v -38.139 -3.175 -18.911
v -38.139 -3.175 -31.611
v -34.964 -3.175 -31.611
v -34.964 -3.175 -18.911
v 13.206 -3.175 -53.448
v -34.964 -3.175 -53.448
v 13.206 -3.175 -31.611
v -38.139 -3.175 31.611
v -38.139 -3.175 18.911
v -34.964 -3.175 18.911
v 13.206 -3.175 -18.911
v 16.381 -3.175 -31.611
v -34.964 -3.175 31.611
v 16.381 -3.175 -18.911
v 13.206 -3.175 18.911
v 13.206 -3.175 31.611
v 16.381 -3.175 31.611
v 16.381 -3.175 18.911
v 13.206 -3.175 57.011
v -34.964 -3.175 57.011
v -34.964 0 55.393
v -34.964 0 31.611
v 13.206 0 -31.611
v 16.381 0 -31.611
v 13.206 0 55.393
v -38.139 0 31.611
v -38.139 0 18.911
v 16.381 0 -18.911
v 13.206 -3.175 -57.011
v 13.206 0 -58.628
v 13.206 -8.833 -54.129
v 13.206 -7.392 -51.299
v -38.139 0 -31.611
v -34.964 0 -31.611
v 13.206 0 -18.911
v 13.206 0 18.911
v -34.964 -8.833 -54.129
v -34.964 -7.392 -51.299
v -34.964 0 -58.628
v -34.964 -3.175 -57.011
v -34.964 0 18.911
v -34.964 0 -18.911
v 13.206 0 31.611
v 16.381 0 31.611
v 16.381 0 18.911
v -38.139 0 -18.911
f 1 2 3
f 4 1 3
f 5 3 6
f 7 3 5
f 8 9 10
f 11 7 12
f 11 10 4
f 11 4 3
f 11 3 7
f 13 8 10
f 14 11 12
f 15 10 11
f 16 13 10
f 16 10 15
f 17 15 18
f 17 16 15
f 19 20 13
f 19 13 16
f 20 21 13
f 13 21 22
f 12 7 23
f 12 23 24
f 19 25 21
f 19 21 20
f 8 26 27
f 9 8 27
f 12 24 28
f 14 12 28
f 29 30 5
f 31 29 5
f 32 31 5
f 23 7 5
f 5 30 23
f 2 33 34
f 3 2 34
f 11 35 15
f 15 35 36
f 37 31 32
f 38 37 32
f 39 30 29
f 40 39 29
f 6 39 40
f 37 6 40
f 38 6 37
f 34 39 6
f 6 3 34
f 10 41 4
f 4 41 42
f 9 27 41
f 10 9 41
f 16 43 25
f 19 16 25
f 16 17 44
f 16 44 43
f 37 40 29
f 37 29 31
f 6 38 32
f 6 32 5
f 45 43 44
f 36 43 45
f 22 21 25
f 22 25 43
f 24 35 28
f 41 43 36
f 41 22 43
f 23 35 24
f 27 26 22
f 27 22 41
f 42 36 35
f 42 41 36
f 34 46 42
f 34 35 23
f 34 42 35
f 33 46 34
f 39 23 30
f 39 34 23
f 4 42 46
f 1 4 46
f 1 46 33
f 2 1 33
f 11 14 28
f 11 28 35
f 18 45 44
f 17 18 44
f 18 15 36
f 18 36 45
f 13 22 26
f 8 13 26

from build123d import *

# Parameters (mm, degrees)
F1_DEPTH = 3.175
F3_DEPTH = 43.942
F5_DEPTH = 76.2
F6_DEPTH = 48.1697538


# Not quite as in the source:
# - a feature names something its author has since deleted; it is built from what else it names


with BuildPart() as f1:
    # F0 (on Front) → F1 (new body)
    with BuildSketch(Plane.XZ):
        Polygon((-34.9639124011, -57.0107064), (9.4471751978, -57.0107064), (13.2058413989, -57.0107064), (13.2058413989, -31.6107064), (16.3808413989, -31.6107064), (16.3808413989, -18.9107064), (13.2058413989, -18.9107064), (13.2058413989, 18.9107064), (16.3808413989, 18.9107064), (16.3808413989, 31.6107064), (13.2058413989, 31.6107064), (13.2058413989, 57.0107064), (-34.9639124011, 57.0107064), (-34.9639124011, 31.6107064), (-38.1389124011, 31.6107064), (-38.1389124011, 18.9107064), (-34.9639124011, 18.9107064), (-34.9639124011, -18.9107064), (-38.1389124011, -18.9107064), (-38.1389124011, -31.6107064), (-34.9639124011, -31.6107064), align=None)
    extrude(amount=F1_DEPTH)

    # F2 (on face) → F3 (join)
    with BuildSketch(Plane(origin=(-34.9639124011, 0, 0), x_dir=(0, -1, 0), z_dir=(-1, 0, 0))):
        Polygon((0, -58.6279720227), (3.175, -57.0107064), (8.8332357394, -54.1285425744), (7.3921538265, -51.2994247047), (0, -55.0648030547), align=None)
    extrude(amount=-F3_DEPTH)

    # F4 (on face) → F5 (cut)
    with BuildSketch(Plane(origin=(-34.9639124011, 0, 0), x_dir=(0, -1, 0), z_dir=(-1, 0, 0))):
        Polygon((0, 55.3934407773), (3.175, 57.0107064), (0, 57.0107064), align=None)
    extrude(amount=-F5_DEPTH, mode=Mode.SUBTRACT)

    # F2 (on face) → F6 (join)
    with BuildSketch(Plane(origin=(-34.9639124011, 0, 0), x_dir=(0, -1, 0), z_dir=(-1, 0, 0))):
        Polygon((0, -58.6279720227), (3.175, -57.0107064), (8.8332357394, -54.1285425744), (7.3921538265, -51.2994247047), (0, -55.0648030547), align=None)
    extrude(amount=-F6_DEPTH)


solid = f1.part
